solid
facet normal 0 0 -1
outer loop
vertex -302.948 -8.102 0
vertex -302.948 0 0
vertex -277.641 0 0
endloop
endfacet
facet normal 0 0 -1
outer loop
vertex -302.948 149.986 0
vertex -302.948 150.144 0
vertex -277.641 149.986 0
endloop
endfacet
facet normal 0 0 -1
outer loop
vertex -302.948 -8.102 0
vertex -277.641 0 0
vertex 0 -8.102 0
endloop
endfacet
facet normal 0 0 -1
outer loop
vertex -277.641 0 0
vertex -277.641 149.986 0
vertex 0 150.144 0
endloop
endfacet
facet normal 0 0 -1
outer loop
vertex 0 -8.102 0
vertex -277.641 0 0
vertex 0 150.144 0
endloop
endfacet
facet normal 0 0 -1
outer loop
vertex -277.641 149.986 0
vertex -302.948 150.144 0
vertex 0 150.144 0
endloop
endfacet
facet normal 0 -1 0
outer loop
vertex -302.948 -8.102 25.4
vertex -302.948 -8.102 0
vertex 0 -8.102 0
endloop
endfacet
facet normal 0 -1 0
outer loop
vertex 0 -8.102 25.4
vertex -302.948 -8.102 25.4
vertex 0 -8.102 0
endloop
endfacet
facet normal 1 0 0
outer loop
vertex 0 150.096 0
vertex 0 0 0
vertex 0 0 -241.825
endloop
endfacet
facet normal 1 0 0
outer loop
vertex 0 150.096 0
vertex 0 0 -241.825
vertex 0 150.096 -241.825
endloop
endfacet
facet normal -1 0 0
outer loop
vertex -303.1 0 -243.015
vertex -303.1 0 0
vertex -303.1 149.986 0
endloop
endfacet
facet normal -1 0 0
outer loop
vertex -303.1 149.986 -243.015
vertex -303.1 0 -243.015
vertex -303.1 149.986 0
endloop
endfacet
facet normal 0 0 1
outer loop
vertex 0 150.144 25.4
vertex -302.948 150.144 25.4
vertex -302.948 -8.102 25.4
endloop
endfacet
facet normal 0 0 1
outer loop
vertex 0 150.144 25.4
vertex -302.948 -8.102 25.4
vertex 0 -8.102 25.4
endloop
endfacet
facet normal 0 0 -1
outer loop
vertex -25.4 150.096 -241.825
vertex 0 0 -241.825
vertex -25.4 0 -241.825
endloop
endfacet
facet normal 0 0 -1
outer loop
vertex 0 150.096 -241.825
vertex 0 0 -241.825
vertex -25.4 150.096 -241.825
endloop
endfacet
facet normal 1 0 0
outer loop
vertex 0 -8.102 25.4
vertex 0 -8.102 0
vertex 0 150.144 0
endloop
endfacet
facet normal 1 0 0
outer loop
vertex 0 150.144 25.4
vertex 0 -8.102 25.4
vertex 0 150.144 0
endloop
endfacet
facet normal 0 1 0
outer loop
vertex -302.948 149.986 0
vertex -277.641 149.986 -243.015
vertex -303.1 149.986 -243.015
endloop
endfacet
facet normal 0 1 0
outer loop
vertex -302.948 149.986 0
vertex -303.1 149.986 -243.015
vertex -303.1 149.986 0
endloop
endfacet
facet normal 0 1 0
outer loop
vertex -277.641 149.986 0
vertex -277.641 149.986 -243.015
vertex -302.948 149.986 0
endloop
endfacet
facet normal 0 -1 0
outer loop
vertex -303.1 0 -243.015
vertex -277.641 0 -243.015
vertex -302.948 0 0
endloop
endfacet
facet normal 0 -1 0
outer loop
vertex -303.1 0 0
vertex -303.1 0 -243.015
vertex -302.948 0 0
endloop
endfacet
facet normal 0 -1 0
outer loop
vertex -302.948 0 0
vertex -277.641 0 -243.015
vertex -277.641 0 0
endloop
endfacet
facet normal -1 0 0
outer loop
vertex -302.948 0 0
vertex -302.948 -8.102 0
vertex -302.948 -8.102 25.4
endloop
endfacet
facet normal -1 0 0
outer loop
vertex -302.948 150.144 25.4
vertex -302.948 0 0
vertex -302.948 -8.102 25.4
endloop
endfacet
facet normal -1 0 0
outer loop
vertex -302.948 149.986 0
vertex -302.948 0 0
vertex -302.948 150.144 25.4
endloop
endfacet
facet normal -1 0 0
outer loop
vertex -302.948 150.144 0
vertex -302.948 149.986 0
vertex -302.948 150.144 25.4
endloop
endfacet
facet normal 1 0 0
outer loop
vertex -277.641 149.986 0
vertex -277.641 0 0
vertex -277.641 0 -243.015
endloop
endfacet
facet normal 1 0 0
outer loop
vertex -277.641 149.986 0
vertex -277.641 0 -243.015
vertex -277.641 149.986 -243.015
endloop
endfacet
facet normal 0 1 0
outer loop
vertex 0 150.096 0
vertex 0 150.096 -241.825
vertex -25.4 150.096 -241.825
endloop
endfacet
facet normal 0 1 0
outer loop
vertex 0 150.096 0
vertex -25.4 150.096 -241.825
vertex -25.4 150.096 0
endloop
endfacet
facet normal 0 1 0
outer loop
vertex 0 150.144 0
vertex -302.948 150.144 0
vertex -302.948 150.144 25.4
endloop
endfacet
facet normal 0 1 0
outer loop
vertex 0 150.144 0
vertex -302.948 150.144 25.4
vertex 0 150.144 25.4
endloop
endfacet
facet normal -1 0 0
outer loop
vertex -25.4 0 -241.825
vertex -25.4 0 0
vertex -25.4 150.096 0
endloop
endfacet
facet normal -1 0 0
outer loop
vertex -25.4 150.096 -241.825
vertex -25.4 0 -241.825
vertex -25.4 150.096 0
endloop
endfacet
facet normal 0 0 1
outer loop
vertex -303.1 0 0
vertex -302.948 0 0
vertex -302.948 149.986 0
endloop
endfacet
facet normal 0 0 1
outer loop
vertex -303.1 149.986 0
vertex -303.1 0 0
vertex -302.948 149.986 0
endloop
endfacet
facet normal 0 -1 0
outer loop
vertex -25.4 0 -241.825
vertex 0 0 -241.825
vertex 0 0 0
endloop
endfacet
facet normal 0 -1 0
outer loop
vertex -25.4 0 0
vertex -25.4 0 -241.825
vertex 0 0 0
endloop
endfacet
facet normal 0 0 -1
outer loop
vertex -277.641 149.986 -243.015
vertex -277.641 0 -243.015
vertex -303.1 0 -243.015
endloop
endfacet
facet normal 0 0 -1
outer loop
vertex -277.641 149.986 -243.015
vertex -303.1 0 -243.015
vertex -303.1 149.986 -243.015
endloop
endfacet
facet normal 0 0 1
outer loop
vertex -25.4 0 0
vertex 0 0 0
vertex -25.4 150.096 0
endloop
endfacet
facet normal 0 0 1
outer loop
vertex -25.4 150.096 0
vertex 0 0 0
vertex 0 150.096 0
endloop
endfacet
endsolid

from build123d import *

# Parameters (mm, degrees)
F0_W     = 302.9477596283
F0_H     = 158.2464948297
F1_DEPTH = 25.4
F2_W     = 150.0960886478
F2_H     = 241.8254166842
F3_DEPTH = 25.4
F5_START = -277.64065
F4_W     = 149.9864310026
F4_H     = 243.0154532194
F5_DEPTH = 25.45956


with BuildPart() as f1:
    # F0 (on Top) → F1 (new body)
    with BuildSketch(Plane.XY):
        with Locations((-151.4738798141, 71.0208192468)):
            Rectangle(F0_W, F0_H)
    extrude(amount=F1_DEPTH)

    # F4 (on Right) → F5 (join)
    with BuildSketch(Plane.YZ.offset(F5_START)):
        with Locations((74.9932155013, -121.5077266097)):
            Rectangle(F4_W, F4_H)
    extrude(amount=-F5_DEPTH)


with BuildPart() as f3:
    # F2 (on Right) → F3 (new body)
    with BuildSketch(Plane.YZ):
        with Locations((75.0480443239, -120.9127083421)):
            Rectangle(F2_W, F2_H)
    extrude(amount=-F3_DEPTH)


solid = Compound([f1.part, f3.part])
